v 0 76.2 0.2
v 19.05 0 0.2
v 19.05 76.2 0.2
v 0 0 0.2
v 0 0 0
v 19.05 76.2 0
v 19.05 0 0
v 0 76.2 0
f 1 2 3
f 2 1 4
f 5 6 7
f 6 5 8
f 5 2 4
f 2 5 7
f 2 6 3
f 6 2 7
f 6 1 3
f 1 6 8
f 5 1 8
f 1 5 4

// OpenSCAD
tape_length = 25.4 * 3;
tape_width = 19.05;
tape_thickness = 0.2;

//
// This builds flat tape.
//
// This is useful for reassembling thin-walled objects that are too big to
// print, and thus have been cut in half to print.  Basically put the tape
// in place and hit it with a heat gun, or if you used ABS, brush it with
// acetate.
//
// by default it's 3" x 0.75" x 0.2mm, with the expectation of being printed
// at 0.2mm layer height (i.e. only the first layer)
//
// contributed by @vathpela
//
module tape(length=tape_length, width=tape_width, height=tape_thickness)
{
    cube([width, length, height]);
}

tape();
